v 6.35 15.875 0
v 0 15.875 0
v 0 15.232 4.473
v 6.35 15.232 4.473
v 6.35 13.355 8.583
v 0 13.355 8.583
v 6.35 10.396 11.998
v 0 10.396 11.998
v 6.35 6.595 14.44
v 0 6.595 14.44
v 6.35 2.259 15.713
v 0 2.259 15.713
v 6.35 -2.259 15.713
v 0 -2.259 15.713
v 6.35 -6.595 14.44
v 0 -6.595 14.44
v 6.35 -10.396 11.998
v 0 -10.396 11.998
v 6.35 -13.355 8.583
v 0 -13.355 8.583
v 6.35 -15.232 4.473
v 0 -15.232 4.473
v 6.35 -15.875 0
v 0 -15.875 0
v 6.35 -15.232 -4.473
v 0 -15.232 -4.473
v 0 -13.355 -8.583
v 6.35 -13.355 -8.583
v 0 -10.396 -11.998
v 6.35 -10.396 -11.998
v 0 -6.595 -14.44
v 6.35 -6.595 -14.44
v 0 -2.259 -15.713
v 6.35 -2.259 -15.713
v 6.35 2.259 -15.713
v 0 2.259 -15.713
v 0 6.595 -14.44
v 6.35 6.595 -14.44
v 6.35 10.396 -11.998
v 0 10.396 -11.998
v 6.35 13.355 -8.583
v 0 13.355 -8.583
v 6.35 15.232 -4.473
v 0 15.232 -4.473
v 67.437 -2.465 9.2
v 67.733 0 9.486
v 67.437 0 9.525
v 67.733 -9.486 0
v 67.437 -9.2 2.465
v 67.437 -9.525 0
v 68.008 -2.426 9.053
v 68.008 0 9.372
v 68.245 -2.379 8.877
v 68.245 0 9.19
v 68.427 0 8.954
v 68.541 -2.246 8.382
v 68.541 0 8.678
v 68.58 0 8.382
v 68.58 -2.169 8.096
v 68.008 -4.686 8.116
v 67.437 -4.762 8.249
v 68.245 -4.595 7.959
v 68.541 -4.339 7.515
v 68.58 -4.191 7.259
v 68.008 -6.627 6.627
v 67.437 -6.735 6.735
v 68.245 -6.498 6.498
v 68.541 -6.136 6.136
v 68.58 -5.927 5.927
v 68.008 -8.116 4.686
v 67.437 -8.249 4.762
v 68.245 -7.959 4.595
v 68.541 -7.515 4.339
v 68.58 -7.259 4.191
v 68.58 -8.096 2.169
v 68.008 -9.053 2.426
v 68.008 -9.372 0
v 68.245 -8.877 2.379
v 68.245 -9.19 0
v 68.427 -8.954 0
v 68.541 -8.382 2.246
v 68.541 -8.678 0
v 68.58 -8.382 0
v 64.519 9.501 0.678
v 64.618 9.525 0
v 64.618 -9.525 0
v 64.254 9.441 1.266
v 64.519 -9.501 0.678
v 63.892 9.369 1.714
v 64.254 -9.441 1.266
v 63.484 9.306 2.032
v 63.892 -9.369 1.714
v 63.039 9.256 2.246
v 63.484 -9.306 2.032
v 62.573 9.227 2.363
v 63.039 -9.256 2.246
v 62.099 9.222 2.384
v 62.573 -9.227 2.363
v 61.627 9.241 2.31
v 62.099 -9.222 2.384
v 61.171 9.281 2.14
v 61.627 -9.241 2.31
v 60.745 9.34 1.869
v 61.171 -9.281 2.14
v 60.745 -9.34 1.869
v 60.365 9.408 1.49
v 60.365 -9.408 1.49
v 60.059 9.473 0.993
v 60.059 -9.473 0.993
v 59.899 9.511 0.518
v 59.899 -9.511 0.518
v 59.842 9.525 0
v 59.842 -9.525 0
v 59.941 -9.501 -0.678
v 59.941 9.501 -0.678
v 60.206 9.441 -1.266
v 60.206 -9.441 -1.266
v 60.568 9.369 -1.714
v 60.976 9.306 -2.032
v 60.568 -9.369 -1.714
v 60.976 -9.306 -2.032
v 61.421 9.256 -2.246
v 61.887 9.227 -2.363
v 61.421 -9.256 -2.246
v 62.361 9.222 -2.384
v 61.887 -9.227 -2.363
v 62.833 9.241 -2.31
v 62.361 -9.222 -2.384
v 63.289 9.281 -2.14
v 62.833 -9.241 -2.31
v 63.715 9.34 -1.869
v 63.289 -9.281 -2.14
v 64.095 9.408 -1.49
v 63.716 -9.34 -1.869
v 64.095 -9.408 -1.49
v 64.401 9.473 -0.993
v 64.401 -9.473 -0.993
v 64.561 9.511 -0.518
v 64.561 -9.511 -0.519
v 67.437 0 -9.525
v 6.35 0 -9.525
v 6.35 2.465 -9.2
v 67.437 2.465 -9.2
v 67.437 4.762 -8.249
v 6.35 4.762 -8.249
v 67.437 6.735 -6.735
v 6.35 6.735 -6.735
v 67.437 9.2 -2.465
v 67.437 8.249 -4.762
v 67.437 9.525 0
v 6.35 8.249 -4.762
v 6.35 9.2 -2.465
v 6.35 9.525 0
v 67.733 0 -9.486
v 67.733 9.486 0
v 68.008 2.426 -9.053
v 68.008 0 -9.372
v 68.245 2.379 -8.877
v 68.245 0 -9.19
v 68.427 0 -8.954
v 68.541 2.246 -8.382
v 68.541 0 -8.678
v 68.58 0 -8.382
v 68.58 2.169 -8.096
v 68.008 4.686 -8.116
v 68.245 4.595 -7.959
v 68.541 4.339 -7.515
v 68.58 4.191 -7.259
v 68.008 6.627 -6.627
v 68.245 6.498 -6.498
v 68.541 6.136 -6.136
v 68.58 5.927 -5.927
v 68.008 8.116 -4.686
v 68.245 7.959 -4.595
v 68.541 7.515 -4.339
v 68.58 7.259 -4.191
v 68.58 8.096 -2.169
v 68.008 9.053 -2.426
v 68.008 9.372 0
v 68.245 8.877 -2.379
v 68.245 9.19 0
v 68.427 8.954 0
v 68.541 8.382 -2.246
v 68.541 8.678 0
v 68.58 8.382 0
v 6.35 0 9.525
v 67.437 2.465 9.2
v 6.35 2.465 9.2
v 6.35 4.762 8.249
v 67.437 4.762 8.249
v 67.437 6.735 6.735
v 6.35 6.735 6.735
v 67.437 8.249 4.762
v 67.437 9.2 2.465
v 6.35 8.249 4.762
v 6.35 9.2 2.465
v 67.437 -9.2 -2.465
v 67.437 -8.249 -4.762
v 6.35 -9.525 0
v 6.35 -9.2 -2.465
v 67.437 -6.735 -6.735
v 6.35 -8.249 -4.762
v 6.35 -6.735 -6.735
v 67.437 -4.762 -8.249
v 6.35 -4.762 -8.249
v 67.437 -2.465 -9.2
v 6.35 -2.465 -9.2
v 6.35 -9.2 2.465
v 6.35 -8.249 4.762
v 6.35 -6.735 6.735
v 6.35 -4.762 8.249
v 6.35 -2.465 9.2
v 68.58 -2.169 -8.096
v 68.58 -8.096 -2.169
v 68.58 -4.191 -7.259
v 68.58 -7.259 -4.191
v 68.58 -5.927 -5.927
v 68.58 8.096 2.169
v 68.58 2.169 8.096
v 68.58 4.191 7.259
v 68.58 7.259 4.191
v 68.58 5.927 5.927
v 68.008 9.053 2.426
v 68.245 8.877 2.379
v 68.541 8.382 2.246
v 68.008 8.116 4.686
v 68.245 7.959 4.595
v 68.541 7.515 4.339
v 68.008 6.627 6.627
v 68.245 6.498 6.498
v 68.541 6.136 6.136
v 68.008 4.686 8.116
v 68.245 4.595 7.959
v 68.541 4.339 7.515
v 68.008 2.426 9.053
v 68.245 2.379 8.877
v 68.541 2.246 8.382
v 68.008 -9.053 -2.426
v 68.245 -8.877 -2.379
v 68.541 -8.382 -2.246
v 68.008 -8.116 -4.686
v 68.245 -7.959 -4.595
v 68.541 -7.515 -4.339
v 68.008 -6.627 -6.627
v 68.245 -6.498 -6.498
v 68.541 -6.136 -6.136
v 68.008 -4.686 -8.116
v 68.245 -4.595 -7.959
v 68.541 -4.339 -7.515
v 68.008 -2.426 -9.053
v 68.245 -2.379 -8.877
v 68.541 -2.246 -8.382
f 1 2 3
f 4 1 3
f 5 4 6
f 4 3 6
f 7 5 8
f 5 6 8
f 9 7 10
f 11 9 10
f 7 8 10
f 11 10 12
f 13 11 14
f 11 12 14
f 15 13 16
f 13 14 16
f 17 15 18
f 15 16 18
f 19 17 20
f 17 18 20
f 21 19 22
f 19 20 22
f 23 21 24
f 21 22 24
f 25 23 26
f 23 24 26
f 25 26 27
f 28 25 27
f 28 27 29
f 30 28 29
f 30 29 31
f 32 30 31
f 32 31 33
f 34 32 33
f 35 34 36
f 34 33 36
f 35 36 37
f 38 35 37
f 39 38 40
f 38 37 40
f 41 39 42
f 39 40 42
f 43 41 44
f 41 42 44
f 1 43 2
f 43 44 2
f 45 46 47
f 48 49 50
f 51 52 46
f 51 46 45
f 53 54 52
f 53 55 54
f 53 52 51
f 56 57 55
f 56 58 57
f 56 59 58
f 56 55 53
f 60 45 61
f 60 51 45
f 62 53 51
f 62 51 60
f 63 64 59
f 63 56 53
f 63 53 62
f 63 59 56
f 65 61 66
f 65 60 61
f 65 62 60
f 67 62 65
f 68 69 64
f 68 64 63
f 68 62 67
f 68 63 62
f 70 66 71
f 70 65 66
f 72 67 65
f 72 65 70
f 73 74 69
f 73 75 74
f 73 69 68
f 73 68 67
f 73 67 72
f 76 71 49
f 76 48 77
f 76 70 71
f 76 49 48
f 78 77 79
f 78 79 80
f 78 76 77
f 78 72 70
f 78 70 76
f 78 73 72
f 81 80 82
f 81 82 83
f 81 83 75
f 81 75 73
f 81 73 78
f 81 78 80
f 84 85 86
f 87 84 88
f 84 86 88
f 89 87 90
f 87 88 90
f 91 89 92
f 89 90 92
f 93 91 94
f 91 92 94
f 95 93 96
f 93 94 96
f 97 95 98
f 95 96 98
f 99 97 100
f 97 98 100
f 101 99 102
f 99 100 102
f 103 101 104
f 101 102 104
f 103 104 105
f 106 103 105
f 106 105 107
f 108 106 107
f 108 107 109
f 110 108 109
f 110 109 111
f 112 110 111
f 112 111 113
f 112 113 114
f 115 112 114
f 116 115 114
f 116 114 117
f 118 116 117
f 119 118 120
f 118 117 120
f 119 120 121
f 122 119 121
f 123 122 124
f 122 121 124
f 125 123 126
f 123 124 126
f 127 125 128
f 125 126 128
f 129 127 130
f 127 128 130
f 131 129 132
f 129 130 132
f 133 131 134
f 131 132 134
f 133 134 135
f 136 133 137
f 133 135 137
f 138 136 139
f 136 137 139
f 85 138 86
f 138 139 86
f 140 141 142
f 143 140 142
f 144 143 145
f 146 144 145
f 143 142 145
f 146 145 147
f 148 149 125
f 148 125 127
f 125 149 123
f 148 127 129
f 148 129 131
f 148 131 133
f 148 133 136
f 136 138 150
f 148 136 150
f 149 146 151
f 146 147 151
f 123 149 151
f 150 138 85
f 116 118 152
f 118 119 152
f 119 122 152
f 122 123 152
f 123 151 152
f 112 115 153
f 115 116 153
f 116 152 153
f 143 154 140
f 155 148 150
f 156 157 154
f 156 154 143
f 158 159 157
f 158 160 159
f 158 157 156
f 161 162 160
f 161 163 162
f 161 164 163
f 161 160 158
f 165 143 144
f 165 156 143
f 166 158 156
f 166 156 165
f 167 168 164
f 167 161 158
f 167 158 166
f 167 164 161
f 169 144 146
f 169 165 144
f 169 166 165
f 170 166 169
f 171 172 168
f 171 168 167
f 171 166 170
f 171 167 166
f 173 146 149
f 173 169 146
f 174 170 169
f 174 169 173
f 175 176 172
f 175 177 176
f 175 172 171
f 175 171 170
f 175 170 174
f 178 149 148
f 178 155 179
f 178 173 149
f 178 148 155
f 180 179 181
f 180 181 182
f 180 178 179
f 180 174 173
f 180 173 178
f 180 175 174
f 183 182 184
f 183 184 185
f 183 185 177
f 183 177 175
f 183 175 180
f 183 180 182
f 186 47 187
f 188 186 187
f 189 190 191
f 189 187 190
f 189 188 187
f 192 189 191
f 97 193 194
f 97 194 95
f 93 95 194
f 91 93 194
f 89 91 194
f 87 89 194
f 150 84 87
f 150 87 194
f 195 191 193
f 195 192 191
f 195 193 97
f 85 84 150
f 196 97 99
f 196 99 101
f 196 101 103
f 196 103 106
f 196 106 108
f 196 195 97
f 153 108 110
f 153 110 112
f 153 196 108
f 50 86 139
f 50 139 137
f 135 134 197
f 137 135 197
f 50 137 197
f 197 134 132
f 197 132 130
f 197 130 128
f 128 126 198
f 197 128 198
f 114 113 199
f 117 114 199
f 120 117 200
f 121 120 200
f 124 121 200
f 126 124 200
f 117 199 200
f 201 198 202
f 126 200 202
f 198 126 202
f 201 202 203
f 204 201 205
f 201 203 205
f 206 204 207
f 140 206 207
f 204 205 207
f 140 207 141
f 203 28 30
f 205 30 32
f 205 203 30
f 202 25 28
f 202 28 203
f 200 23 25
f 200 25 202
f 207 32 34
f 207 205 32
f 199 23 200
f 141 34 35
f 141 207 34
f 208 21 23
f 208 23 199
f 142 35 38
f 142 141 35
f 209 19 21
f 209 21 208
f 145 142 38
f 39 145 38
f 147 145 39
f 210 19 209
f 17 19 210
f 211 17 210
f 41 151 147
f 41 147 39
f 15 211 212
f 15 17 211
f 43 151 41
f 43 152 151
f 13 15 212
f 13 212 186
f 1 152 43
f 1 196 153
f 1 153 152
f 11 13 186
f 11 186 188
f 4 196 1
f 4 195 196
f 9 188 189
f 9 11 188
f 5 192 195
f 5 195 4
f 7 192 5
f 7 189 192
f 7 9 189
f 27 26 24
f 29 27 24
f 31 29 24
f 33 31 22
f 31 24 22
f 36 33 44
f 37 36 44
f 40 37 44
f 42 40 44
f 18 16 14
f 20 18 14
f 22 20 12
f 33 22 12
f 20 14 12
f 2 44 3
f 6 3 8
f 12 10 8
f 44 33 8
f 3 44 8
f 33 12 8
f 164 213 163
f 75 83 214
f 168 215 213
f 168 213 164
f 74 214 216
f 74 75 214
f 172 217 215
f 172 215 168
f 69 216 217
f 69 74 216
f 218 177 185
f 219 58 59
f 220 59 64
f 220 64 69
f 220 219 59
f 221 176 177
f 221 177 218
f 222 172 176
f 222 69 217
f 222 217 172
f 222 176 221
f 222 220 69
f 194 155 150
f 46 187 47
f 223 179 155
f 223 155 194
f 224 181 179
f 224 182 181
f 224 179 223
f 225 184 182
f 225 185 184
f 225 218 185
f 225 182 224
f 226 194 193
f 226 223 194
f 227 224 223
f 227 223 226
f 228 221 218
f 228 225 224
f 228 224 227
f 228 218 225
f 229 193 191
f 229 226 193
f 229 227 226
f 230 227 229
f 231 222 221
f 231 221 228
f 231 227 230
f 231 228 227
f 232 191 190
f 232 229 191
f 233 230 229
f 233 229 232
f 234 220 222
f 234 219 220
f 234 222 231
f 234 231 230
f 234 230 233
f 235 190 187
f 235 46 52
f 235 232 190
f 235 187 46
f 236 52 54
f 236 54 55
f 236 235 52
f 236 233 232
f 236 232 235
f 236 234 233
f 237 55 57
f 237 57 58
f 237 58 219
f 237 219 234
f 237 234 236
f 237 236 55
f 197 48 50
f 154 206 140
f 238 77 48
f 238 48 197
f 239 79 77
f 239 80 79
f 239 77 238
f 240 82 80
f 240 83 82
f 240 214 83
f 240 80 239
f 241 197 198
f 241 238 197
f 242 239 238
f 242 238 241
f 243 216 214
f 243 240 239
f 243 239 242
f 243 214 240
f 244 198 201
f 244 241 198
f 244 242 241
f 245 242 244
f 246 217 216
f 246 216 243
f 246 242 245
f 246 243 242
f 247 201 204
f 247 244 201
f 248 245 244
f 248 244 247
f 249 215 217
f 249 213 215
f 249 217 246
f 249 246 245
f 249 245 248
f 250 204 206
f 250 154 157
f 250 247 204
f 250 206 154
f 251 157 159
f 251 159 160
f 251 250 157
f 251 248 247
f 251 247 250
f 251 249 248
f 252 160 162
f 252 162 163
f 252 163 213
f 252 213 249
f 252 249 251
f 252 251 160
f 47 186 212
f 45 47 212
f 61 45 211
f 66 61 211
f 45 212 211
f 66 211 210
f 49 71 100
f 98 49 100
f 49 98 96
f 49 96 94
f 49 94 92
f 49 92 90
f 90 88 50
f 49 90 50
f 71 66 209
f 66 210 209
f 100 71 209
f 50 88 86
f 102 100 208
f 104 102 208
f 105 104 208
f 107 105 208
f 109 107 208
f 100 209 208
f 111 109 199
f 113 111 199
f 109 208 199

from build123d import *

# Parameters (mm, degrees)
F0_R        = 15.875
F1_DEPTH    = 6.35
F2_W        = 9.525
F2_H        = 9.525
F3_DEPTH    = 62.23
F4_R        = 2.3876
F5_DEPTH    = 25.4
F6_T1_DEPTH = 62.23
F7_R        = 1.143


# Not quite as in the source:
# - a fillet or chamfer that OpenCascade refuses, or shapes differently, is made with other operations: its cross-section is extruded or revolved along the edge and cut away or added


with BuildPart() as f1:
    # F0 (on Right) → F1 (new body)
    with BuildSketch(Plane.YZ):
        Circle(F0_R)
    extrude(amount=F1_DEPTH)

    # F2 (on face) → F3 (join)
    with BuildSketch(Plane.YZ.offset(6.35)):
        with Locations((4.7625, 4.7625)):
            Rectangle(F2_W, F2_H)
        with Locations((-4.7625, -4.7625)):
            Rectangle(F2_W, F2_H)
        with Locations((-4.7625, 4.7625)):
            Rectangle(F2_W, F2_H)
        with Locations((4.7625, -4.7625)):
            Rectangle(F2_W, F2_H)
    extrude(amount=F3_DEPTH)

    # F4 (on face) → F5 (cut)
    with BuildSketch(Plane.XZ.offset(9.525)):
        with Locations((62.23, 0)):
            Circle(F4_R)
    extrude(amount=-F5_DEPTH, mode=Mode.SUBTRACT)

    # F6: fillet of radius 9.525 on 4 edges, made by hand

    # F6_s2 → F6_t1 (cut)
    with BuildSketch(Plane.YZ.offset(6.35)):
        with BuildLine():
            ThreePointArc((0, 9.525), (-6.7351920908, 6.7351920908), (-9.525, 0))
            Line((-9.525, 0), (-9.7155, 0))
            Line((-9.7155, 0), (-9.7155, 9.7155))
            Line((-9.7155, 9.7155), (0, 9.7155))
            Line((0, 9.7155), (0, 9.525))
        make_face()
        with BuildLine():
            ThreePointArc((0, 9.525), (6.7351920908, 6.7351920908), (9.525, 0))
            Line((9.525, 0), (9.7155, 0))
            Line((9.7155, 0), (9.7155, 9.7155))
            Line((9.7155, 9.7155), (0, 9.7155))
            Line((0, 9.7155), (0, 9.525))
        make_face()
        with BuildLine():
            ThreePointArc((-9.525, 0), (-6.7351920908, -6.7351920908), (0, -9.525))
            Line((0, -9.525), (0, -9.7155))
            Line((0, -9.7155), (-9.7155, -9.7155))
            Line((-9.7155, -9.7155), (-9.7155, 0))
            Line((-9.7155, 0), (-9.525, 0))
        make_face()
        with BuildLine():
            ThreePointArc((0, -9.525), (6.7351920908, -6.7351920908), (9.525, 0))
            Line((9.525, 0), (9.7155, 0))
            Line((9.7155, 0), (9.7155, -9.7155))
            Line((9.7155, -9.7155), (0, -9.7155))
            Line((0, -9.7155), (0, -9.525))
        make_face()
    extrude(amount=F6_T1_DEPTH, mode=Mode.SUBTRACT)

    # F7
    f7_edges = [f1.edges().sort_by_distance(p)[0] for p in [
        (68.58, -6.735192, -6.735192),
    ]]
    fillet(f7_edges, radius=F7_R)


solid = f1.part
